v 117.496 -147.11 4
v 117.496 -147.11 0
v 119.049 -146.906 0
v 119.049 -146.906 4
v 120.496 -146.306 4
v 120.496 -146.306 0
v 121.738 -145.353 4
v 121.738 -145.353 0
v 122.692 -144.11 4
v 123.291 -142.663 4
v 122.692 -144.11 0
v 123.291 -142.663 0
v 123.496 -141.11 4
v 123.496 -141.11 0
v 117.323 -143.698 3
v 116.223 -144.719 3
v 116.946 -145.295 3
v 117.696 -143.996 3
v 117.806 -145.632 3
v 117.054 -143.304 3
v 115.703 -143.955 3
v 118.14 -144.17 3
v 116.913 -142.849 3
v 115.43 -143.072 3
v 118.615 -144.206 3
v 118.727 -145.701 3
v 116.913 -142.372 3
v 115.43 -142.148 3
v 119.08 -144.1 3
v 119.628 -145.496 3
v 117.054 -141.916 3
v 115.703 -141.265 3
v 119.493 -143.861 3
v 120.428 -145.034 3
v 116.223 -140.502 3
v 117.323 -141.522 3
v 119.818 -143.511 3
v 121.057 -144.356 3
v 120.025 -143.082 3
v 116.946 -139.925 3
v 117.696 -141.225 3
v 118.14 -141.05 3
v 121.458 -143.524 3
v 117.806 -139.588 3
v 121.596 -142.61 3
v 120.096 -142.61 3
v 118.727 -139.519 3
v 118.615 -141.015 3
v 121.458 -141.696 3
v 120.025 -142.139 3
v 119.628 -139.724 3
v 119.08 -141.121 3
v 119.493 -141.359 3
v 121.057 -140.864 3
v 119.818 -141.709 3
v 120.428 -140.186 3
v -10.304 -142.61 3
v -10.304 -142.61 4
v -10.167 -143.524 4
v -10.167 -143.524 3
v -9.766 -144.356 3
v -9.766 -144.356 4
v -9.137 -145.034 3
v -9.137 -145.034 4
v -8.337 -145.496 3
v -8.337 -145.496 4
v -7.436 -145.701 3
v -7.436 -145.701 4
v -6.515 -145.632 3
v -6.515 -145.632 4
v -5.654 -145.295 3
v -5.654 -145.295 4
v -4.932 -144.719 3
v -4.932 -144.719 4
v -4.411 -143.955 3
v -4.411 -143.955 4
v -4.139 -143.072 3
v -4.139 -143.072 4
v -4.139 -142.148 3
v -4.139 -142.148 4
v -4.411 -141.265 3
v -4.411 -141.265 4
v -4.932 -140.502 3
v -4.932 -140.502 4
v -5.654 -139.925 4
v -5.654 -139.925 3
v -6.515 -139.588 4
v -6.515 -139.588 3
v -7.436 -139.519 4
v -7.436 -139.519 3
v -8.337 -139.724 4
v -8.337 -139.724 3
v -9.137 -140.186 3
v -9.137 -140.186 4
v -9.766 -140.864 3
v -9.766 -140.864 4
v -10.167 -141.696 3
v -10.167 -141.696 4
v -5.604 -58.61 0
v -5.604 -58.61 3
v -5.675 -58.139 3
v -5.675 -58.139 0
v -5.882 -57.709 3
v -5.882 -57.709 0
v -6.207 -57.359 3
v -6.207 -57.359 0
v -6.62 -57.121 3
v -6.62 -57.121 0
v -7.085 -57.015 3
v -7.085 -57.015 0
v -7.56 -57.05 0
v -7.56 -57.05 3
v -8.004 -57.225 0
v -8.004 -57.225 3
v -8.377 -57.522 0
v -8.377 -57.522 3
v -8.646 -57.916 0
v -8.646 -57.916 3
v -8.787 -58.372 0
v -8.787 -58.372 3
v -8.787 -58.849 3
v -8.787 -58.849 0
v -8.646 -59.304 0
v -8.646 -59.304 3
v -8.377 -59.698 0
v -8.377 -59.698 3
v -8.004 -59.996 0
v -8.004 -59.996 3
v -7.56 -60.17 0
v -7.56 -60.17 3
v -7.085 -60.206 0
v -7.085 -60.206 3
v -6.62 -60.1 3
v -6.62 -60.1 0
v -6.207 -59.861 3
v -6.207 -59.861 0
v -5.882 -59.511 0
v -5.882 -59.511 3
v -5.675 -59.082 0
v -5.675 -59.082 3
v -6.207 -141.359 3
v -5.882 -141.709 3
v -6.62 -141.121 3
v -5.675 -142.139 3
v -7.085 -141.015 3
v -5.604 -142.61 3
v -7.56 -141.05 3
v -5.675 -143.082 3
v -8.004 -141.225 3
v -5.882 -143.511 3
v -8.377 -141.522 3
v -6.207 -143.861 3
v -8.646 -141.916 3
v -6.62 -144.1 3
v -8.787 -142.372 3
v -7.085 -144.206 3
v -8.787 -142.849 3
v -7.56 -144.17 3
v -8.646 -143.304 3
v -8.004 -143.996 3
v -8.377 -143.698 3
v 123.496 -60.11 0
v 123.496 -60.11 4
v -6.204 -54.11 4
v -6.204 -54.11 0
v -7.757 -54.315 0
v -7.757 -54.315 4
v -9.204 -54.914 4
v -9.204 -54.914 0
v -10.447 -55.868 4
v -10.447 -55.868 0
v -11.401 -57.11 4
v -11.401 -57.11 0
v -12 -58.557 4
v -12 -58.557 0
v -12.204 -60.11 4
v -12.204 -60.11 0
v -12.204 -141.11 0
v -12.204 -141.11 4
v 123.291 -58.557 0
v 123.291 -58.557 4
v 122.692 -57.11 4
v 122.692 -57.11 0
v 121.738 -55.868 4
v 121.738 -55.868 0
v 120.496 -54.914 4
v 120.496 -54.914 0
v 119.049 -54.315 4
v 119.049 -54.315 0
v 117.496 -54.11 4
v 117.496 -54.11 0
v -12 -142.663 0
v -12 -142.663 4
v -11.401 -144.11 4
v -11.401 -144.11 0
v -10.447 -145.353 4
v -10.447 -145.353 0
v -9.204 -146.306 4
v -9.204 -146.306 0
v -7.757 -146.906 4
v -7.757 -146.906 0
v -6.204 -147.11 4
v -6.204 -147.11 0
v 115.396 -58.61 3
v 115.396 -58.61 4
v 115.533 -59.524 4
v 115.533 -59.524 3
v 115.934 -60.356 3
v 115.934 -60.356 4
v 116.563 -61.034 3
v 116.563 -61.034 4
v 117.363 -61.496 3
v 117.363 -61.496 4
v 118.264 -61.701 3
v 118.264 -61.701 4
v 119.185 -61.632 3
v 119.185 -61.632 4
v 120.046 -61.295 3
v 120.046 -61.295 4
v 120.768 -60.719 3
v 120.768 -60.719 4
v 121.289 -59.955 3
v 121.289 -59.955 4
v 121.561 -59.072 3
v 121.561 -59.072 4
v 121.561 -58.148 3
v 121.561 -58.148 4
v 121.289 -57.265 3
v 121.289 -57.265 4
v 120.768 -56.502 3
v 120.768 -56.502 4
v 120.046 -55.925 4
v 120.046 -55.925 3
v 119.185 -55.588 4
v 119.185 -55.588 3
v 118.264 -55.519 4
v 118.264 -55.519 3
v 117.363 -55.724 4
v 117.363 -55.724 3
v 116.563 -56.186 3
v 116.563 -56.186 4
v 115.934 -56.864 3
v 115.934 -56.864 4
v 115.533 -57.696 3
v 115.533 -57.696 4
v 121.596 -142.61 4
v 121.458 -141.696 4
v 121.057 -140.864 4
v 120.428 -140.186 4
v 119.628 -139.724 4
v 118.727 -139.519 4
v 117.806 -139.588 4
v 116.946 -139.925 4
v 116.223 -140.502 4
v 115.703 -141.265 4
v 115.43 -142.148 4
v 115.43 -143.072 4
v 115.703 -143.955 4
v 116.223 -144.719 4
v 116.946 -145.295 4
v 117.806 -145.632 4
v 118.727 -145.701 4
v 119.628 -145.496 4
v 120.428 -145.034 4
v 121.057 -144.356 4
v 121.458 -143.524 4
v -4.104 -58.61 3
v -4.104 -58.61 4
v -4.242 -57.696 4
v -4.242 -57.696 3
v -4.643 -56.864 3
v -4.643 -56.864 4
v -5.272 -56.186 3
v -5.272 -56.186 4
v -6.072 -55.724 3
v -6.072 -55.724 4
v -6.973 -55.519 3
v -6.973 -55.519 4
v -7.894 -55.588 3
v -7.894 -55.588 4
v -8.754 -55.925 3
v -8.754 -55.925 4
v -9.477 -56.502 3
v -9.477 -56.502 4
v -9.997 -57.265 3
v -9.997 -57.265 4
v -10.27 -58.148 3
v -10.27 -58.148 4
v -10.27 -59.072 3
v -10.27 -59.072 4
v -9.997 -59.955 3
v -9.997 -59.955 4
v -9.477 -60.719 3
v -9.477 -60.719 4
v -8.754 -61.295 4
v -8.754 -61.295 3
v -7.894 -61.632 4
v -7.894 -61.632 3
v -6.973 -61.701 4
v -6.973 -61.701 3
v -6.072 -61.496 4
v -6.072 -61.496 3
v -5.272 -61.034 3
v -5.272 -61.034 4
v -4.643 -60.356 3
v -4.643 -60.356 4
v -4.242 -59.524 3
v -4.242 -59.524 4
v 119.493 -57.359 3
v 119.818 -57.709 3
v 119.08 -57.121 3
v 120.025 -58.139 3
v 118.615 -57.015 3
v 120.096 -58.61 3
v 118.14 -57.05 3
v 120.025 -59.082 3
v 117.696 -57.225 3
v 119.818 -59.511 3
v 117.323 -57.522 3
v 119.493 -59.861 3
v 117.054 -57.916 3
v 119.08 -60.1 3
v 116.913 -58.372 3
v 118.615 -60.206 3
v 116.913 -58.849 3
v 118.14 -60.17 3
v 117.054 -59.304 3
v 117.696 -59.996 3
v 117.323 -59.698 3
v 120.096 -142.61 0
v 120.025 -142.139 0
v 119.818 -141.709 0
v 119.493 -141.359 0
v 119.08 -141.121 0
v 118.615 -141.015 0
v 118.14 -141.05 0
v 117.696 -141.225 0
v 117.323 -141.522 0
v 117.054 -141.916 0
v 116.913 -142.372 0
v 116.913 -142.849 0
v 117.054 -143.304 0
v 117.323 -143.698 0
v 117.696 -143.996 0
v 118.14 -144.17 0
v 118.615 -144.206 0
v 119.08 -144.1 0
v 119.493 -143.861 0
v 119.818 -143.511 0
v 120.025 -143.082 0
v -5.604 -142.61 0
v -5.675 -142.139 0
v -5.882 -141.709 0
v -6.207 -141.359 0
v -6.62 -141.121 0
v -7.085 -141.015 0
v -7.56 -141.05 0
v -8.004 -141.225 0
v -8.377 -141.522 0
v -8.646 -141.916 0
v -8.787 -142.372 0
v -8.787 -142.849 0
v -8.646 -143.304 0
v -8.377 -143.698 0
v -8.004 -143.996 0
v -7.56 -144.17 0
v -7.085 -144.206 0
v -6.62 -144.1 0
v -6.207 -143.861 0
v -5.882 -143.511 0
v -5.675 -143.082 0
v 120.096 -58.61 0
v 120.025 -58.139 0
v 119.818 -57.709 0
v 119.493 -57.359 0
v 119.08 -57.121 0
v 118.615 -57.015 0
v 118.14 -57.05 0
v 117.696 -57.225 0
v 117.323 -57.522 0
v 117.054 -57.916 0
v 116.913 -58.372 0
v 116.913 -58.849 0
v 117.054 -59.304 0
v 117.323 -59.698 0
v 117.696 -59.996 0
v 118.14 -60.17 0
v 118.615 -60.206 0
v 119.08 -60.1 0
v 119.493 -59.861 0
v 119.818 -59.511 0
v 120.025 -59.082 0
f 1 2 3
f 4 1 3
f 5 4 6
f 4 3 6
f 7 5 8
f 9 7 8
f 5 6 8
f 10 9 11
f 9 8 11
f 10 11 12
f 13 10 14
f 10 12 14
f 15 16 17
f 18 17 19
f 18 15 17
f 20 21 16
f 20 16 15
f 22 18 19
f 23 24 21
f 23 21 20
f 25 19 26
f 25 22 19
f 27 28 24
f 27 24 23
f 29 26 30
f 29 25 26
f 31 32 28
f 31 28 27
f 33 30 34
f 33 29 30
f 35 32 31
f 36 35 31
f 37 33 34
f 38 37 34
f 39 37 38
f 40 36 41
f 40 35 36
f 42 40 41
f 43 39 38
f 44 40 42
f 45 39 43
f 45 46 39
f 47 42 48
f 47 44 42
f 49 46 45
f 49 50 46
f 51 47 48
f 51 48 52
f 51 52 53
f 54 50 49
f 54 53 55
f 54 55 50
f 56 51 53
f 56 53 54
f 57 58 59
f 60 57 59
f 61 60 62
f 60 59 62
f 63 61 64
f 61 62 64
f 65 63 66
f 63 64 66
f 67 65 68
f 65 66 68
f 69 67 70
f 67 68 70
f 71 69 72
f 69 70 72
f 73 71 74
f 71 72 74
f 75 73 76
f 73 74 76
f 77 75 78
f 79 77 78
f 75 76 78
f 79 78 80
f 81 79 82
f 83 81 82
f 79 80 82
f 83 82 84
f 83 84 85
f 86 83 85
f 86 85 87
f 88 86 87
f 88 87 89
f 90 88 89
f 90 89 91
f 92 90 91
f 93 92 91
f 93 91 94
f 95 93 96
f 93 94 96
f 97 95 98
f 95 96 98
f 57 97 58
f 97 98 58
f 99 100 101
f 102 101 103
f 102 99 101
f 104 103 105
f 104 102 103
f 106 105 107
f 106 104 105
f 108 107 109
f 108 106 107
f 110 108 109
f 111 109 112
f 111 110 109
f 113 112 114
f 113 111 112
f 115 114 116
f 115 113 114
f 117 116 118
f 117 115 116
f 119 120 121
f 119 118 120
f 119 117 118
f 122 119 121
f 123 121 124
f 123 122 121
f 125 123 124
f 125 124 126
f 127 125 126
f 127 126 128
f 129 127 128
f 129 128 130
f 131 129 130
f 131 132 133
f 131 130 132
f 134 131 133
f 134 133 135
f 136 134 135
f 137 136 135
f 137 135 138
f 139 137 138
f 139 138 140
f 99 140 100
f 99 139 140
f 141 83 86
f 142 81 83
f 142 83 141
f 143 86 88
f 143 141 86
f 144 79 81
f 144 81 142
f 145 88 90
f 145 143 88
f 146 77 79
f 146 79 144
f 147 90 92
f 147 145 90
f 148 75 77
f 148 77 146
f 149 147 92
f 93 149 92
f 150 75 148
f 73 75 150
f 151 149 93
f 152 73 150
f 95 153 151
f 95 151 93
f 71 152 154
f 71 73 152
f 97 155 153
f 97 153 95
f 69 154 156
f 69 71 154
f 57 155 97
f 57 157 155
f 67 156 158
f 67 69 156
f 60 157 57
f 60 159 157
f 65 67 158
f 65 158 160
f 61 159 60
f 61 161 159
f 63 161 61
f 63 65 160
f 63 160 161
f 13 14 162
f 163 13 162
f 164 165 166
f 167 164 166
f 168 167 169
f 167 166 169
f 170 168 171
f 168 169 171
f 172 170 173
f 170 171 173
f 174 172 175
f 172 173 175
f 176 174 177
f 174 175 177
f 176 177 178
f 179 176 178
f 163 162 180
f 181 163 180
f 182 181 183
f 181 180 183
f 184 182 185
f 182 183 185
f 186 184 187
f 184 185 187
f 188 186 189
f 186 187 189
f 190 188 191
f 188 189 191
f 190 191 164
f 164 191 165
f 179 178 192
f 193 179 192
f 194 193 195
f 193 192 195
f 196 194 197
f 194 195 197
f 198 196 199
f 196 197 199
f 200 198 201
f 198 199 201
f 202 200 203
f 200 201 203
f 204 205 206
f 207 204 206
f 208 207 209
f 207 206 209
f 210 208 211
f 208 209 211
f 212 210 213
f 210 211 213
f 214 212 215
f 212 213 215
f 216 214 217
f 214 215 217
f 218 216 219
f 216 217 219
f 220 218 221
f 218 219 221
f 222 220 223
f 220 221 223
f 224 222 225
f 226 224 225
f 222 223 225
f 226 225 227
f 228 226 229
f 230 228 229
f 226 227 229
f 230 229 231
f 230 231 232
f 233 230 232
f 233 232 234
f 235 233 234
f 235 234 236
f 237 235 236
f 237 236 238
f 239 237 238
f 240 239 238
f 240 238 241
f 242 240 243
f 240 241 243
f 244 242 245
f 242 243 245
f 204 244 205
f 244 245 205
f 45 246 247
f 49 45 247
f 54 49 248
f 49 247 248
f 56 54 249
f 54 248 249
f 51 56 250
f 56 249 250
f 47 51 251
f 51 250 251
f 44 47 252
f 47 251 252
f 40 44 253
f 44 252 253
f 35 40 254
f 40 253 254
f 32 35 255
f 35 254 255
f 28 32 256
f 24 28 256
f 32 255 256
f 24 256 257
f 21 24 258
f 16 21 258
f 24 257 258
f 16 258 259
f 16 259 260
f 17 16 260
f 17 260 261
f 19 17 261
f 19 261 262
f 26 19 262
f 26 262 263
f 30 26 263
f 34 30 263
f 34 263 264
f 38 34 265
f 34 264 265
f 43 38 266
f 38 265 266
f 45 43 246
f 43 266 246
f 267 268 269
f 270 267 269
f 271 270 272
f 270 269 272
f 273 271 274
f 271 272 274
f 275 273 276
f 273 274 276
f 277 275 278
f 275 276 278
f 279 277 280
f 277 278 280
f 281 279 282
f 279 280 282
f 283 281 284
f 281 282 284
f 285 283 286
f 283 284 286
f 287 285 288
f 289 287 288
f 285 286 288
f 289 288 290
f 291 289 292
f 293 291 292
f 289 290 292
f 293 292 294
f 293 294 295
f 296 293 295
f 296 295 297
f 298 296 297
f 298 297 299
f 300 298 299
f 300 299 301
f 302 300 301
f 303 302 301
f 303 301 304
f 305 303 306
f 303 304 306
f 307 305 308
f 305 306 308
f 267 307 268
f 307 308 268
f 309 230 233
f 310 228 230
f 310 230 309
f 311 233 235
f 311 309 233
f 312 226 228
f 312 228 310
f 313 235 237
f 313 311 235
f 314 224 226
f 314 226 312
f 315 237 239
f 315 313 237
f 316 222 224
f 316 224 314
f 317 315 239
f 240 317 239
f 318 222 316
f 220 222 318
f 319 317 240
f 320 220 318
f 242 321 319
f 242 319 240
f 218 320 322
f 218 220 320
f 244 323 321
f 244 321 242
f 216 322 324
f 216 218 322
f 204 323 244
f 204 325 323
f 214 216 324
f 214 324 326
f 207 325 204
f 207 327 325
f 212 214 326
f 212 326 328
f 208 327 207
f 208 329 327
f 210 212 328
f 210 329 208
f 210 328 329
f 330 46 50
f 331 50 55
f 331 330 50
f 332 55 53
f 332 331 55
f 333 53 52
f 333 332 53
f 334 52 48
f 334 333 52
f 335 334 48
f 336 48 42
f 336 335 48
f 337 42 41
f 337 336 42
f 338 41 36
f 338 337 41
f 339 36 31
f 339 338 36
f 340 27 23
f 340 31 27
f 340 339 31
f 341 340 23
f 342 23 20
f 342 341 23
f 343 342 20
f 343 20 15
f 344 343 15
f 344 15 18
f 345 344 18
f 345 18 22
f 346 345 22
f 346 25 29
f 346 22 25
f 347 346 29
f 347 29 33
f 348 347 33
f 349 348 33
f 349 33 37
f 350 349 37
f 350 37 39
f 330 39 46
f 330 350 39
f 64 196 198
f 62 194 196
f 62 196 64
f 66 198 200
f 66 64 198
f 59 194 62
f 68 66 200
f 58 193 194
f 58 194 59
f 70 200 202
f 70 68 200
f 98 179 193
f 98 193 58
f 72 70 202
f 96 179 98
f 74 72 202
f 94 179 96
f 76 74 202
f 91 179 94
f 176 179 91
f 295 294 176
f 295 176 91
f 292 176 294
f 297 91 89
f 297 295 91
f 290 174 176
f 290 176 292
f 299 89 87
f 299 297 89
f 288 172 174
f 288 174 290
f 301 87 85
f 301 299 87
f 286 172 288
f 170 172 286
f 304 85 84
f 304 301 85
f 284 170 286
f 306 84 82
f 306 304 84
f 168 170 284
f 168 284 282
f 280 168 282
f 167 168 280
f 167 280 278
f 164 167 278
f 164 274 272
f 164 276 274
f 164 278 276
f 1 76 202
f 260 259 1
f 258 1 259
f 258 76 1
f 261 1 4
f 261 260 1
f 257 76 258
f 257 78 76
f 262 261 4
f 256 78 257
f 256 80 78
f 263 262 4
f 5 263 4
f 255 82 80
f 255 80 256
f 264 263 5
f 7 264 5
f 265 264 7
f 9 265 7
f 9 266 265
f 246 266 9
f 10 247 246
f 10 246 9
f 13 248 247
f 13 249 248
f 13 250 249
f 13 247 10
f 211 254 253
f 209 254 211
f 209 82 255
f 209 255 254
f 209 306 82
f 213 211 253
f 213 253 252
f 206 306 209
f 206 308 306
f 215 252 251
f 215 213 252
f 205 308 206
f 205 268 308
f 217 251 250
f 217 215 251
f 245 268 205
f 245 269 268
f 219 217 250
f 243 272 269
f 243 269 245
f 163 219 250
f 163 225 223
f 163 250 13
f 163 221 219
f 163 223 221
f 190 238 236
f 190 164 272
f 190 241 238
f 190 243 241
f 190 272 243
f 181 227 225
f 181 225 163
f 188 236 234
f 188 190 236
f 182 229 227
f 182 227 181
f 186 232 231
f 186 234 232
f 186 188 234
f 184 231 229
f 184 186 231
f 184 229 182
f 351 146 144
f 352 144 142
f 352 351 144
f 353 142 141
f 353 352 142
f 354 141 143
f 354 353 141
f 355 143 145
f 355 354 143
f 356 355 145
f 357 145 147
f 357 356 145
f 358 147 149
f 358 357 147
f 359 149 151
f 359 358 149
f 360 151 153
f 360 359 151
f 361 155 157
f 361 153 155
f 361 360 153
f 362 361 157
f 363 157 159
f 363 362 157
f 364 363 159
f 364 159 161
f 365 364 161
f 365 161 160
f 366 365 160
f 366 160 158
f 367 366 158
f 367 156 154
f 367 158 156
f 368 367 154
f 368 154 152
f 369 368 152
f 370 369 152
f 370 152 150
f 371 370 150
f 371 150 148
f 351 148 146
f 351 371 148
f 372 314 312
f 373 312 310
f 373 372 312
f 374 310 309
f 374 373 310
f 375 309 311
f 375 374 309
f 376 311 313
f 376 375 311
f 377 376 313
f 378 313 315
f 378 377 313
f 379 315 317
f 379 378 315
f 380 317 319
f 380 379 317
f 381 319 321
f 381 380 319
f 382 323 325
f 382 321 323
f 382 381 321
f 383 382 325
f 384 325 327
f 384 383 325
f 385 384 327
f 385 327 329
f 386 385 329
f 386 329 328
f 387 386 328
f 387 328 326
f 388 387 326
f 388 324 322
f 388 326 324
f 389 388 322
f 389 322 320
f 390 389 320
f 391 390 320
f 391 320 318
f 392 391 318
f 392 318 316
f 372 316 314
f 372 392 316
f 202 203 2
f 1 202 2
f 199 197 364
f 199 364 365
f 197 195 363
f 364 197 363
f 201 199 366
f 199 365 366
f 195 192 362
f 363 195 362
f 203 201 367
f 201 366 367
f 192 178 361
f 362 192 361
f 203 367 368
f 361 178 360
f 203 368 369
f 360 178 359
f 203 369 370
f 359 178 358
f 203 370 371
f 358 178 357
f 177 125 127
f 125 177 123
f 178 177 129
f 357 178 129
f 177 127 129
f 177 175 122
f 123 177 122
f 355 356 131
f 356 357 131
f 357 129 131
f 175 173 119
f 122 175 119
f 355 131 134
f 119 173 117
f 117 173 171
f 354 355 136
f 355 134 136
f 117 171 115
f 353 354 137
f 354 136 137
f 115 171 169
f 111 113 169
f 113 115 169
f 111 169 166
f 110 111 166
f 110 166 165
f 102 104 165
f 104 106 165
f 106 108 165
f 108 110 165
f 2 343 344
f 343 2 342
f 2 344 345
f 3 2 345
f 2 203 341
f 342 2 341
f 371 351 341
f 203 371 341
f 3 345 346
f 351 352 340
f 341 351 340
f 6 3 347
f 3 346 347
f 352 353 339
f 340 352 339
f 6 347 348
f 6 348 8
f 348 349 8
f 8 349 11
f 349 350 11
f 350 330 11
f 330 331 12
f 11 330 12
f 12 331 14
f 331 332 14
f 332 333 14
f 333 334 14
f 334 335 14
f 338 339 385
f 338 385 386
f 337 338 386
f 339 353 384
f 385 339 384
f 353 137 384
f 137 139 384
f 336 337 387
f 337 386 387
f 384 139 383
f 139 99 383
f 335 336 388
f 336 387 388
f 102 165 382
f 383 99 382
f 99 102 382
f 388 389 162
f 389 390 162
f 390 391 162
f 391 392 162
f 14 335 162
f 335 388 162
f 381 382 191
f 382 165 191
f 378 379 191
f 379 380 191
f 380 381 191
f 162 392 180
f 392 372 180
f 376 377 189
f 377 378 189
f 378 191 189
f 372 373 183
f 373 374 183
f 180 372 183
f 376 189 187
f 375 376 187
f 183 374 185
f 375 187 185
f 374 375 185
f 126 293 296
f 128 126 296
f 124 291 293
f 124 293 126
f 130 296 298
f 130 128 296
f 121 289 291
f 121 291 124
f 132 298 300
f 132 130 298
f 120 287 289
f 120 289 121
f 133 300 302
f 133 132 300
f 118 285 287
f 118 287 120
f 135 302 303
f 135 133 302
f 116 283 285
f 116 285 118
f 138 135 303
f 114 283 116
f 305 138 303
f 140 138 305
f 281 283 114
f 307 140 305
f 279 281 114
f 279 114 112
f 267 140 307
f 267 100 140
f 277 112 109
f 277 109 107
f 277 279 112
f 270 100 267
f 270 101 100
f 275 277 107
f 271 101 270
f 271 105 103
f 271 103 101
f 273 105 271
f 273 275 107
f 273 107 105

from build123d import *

# Parameters (mm, degrees)
SKETCH1_R           = 1.6
BOSS_EXTRUDE1_DEPTH = 4
SKETCH2_R           = 3.1
CUT_EXTRUDE1_DEPTH  = 1


with BuildPart() as part:
    # Sketch1 → Boss-Extrude1 (new body)
    with BuildSketch(Plane.XY):
        with BuildLine():
            Line((-12.204375178, -60.110154246), (-12.204375178, -141.110154246))
            ThreePointArc((-12.204375178, -141.110154246), (-10.447015865, -145.352794933), (-6.204375178, -147.110154246))
            Line((-6.204375178, -147.110154246), (117.495624822, -147.110154246))
            ThreePointArc((117.495624822, -147.110154246), (121.738265509, -145.352794933), (123.495624822, -141.110154246))
            Line((123.495624822, -141.110154246), (123.495624822, -60.110154246))
            ThreePointArc((123.495624822, -60.110154246), (121.738265509, -55.867513558), (117.495624822, -54.110154246))
            Line((117.495624822, -54.110154246), (-6.204375178, -54.110154246))
            ThreePointArc((-6.204375178, -54.110154246), (-10.447015865, -55.867513558), (-12.204375178, -60.110154246))
        make_face()
        with Locations((-7.204375178, -58.610154246)):
            Circle(SKETCH1_R, mode=Mode.SUBTRACT)
        with Locations((118.495624822, -58.610154246)):
            Circle(SKETCH1_R, mode=Mode.SUBTRACT)
        with Locations((118.495624822, -142.610154246)):
            Circle(SKETCH1_R, mode=Mode.SUBTRACT)
        with Locations((-7.204375178, -142.610154246)):
            Circle(SKETCH1_R, mode=Mode.SUBTRACT)
    extrude(amount=BOSS_EXTRUDE1_DEPTH)

    # Sketch2 → Cut-Extrude1 (cut)
    with BuildSketch(Plane.XY.offset(4)):
        with Locations((-7.204375178, -58.610154246)):
            Circle(SKETCH2_R)
        with Locations(Location((118.495624822, -58.610154246, 0), (0, 0, 180))):
            Circle(SKETCH2_R)
        with Locations((118.495624822, -142.610154246)):
            Circle(SKETCH2_R)
        with Locations(Location((-7.204375178, -142.610154246, 0), (0, 0, 180))):
            Circle(SKETCH2_R)
    extrude(amount=-CUT_EXTRUDE1_DEPTH, mode=Mode.SUBTRACT)


solid = part.part
